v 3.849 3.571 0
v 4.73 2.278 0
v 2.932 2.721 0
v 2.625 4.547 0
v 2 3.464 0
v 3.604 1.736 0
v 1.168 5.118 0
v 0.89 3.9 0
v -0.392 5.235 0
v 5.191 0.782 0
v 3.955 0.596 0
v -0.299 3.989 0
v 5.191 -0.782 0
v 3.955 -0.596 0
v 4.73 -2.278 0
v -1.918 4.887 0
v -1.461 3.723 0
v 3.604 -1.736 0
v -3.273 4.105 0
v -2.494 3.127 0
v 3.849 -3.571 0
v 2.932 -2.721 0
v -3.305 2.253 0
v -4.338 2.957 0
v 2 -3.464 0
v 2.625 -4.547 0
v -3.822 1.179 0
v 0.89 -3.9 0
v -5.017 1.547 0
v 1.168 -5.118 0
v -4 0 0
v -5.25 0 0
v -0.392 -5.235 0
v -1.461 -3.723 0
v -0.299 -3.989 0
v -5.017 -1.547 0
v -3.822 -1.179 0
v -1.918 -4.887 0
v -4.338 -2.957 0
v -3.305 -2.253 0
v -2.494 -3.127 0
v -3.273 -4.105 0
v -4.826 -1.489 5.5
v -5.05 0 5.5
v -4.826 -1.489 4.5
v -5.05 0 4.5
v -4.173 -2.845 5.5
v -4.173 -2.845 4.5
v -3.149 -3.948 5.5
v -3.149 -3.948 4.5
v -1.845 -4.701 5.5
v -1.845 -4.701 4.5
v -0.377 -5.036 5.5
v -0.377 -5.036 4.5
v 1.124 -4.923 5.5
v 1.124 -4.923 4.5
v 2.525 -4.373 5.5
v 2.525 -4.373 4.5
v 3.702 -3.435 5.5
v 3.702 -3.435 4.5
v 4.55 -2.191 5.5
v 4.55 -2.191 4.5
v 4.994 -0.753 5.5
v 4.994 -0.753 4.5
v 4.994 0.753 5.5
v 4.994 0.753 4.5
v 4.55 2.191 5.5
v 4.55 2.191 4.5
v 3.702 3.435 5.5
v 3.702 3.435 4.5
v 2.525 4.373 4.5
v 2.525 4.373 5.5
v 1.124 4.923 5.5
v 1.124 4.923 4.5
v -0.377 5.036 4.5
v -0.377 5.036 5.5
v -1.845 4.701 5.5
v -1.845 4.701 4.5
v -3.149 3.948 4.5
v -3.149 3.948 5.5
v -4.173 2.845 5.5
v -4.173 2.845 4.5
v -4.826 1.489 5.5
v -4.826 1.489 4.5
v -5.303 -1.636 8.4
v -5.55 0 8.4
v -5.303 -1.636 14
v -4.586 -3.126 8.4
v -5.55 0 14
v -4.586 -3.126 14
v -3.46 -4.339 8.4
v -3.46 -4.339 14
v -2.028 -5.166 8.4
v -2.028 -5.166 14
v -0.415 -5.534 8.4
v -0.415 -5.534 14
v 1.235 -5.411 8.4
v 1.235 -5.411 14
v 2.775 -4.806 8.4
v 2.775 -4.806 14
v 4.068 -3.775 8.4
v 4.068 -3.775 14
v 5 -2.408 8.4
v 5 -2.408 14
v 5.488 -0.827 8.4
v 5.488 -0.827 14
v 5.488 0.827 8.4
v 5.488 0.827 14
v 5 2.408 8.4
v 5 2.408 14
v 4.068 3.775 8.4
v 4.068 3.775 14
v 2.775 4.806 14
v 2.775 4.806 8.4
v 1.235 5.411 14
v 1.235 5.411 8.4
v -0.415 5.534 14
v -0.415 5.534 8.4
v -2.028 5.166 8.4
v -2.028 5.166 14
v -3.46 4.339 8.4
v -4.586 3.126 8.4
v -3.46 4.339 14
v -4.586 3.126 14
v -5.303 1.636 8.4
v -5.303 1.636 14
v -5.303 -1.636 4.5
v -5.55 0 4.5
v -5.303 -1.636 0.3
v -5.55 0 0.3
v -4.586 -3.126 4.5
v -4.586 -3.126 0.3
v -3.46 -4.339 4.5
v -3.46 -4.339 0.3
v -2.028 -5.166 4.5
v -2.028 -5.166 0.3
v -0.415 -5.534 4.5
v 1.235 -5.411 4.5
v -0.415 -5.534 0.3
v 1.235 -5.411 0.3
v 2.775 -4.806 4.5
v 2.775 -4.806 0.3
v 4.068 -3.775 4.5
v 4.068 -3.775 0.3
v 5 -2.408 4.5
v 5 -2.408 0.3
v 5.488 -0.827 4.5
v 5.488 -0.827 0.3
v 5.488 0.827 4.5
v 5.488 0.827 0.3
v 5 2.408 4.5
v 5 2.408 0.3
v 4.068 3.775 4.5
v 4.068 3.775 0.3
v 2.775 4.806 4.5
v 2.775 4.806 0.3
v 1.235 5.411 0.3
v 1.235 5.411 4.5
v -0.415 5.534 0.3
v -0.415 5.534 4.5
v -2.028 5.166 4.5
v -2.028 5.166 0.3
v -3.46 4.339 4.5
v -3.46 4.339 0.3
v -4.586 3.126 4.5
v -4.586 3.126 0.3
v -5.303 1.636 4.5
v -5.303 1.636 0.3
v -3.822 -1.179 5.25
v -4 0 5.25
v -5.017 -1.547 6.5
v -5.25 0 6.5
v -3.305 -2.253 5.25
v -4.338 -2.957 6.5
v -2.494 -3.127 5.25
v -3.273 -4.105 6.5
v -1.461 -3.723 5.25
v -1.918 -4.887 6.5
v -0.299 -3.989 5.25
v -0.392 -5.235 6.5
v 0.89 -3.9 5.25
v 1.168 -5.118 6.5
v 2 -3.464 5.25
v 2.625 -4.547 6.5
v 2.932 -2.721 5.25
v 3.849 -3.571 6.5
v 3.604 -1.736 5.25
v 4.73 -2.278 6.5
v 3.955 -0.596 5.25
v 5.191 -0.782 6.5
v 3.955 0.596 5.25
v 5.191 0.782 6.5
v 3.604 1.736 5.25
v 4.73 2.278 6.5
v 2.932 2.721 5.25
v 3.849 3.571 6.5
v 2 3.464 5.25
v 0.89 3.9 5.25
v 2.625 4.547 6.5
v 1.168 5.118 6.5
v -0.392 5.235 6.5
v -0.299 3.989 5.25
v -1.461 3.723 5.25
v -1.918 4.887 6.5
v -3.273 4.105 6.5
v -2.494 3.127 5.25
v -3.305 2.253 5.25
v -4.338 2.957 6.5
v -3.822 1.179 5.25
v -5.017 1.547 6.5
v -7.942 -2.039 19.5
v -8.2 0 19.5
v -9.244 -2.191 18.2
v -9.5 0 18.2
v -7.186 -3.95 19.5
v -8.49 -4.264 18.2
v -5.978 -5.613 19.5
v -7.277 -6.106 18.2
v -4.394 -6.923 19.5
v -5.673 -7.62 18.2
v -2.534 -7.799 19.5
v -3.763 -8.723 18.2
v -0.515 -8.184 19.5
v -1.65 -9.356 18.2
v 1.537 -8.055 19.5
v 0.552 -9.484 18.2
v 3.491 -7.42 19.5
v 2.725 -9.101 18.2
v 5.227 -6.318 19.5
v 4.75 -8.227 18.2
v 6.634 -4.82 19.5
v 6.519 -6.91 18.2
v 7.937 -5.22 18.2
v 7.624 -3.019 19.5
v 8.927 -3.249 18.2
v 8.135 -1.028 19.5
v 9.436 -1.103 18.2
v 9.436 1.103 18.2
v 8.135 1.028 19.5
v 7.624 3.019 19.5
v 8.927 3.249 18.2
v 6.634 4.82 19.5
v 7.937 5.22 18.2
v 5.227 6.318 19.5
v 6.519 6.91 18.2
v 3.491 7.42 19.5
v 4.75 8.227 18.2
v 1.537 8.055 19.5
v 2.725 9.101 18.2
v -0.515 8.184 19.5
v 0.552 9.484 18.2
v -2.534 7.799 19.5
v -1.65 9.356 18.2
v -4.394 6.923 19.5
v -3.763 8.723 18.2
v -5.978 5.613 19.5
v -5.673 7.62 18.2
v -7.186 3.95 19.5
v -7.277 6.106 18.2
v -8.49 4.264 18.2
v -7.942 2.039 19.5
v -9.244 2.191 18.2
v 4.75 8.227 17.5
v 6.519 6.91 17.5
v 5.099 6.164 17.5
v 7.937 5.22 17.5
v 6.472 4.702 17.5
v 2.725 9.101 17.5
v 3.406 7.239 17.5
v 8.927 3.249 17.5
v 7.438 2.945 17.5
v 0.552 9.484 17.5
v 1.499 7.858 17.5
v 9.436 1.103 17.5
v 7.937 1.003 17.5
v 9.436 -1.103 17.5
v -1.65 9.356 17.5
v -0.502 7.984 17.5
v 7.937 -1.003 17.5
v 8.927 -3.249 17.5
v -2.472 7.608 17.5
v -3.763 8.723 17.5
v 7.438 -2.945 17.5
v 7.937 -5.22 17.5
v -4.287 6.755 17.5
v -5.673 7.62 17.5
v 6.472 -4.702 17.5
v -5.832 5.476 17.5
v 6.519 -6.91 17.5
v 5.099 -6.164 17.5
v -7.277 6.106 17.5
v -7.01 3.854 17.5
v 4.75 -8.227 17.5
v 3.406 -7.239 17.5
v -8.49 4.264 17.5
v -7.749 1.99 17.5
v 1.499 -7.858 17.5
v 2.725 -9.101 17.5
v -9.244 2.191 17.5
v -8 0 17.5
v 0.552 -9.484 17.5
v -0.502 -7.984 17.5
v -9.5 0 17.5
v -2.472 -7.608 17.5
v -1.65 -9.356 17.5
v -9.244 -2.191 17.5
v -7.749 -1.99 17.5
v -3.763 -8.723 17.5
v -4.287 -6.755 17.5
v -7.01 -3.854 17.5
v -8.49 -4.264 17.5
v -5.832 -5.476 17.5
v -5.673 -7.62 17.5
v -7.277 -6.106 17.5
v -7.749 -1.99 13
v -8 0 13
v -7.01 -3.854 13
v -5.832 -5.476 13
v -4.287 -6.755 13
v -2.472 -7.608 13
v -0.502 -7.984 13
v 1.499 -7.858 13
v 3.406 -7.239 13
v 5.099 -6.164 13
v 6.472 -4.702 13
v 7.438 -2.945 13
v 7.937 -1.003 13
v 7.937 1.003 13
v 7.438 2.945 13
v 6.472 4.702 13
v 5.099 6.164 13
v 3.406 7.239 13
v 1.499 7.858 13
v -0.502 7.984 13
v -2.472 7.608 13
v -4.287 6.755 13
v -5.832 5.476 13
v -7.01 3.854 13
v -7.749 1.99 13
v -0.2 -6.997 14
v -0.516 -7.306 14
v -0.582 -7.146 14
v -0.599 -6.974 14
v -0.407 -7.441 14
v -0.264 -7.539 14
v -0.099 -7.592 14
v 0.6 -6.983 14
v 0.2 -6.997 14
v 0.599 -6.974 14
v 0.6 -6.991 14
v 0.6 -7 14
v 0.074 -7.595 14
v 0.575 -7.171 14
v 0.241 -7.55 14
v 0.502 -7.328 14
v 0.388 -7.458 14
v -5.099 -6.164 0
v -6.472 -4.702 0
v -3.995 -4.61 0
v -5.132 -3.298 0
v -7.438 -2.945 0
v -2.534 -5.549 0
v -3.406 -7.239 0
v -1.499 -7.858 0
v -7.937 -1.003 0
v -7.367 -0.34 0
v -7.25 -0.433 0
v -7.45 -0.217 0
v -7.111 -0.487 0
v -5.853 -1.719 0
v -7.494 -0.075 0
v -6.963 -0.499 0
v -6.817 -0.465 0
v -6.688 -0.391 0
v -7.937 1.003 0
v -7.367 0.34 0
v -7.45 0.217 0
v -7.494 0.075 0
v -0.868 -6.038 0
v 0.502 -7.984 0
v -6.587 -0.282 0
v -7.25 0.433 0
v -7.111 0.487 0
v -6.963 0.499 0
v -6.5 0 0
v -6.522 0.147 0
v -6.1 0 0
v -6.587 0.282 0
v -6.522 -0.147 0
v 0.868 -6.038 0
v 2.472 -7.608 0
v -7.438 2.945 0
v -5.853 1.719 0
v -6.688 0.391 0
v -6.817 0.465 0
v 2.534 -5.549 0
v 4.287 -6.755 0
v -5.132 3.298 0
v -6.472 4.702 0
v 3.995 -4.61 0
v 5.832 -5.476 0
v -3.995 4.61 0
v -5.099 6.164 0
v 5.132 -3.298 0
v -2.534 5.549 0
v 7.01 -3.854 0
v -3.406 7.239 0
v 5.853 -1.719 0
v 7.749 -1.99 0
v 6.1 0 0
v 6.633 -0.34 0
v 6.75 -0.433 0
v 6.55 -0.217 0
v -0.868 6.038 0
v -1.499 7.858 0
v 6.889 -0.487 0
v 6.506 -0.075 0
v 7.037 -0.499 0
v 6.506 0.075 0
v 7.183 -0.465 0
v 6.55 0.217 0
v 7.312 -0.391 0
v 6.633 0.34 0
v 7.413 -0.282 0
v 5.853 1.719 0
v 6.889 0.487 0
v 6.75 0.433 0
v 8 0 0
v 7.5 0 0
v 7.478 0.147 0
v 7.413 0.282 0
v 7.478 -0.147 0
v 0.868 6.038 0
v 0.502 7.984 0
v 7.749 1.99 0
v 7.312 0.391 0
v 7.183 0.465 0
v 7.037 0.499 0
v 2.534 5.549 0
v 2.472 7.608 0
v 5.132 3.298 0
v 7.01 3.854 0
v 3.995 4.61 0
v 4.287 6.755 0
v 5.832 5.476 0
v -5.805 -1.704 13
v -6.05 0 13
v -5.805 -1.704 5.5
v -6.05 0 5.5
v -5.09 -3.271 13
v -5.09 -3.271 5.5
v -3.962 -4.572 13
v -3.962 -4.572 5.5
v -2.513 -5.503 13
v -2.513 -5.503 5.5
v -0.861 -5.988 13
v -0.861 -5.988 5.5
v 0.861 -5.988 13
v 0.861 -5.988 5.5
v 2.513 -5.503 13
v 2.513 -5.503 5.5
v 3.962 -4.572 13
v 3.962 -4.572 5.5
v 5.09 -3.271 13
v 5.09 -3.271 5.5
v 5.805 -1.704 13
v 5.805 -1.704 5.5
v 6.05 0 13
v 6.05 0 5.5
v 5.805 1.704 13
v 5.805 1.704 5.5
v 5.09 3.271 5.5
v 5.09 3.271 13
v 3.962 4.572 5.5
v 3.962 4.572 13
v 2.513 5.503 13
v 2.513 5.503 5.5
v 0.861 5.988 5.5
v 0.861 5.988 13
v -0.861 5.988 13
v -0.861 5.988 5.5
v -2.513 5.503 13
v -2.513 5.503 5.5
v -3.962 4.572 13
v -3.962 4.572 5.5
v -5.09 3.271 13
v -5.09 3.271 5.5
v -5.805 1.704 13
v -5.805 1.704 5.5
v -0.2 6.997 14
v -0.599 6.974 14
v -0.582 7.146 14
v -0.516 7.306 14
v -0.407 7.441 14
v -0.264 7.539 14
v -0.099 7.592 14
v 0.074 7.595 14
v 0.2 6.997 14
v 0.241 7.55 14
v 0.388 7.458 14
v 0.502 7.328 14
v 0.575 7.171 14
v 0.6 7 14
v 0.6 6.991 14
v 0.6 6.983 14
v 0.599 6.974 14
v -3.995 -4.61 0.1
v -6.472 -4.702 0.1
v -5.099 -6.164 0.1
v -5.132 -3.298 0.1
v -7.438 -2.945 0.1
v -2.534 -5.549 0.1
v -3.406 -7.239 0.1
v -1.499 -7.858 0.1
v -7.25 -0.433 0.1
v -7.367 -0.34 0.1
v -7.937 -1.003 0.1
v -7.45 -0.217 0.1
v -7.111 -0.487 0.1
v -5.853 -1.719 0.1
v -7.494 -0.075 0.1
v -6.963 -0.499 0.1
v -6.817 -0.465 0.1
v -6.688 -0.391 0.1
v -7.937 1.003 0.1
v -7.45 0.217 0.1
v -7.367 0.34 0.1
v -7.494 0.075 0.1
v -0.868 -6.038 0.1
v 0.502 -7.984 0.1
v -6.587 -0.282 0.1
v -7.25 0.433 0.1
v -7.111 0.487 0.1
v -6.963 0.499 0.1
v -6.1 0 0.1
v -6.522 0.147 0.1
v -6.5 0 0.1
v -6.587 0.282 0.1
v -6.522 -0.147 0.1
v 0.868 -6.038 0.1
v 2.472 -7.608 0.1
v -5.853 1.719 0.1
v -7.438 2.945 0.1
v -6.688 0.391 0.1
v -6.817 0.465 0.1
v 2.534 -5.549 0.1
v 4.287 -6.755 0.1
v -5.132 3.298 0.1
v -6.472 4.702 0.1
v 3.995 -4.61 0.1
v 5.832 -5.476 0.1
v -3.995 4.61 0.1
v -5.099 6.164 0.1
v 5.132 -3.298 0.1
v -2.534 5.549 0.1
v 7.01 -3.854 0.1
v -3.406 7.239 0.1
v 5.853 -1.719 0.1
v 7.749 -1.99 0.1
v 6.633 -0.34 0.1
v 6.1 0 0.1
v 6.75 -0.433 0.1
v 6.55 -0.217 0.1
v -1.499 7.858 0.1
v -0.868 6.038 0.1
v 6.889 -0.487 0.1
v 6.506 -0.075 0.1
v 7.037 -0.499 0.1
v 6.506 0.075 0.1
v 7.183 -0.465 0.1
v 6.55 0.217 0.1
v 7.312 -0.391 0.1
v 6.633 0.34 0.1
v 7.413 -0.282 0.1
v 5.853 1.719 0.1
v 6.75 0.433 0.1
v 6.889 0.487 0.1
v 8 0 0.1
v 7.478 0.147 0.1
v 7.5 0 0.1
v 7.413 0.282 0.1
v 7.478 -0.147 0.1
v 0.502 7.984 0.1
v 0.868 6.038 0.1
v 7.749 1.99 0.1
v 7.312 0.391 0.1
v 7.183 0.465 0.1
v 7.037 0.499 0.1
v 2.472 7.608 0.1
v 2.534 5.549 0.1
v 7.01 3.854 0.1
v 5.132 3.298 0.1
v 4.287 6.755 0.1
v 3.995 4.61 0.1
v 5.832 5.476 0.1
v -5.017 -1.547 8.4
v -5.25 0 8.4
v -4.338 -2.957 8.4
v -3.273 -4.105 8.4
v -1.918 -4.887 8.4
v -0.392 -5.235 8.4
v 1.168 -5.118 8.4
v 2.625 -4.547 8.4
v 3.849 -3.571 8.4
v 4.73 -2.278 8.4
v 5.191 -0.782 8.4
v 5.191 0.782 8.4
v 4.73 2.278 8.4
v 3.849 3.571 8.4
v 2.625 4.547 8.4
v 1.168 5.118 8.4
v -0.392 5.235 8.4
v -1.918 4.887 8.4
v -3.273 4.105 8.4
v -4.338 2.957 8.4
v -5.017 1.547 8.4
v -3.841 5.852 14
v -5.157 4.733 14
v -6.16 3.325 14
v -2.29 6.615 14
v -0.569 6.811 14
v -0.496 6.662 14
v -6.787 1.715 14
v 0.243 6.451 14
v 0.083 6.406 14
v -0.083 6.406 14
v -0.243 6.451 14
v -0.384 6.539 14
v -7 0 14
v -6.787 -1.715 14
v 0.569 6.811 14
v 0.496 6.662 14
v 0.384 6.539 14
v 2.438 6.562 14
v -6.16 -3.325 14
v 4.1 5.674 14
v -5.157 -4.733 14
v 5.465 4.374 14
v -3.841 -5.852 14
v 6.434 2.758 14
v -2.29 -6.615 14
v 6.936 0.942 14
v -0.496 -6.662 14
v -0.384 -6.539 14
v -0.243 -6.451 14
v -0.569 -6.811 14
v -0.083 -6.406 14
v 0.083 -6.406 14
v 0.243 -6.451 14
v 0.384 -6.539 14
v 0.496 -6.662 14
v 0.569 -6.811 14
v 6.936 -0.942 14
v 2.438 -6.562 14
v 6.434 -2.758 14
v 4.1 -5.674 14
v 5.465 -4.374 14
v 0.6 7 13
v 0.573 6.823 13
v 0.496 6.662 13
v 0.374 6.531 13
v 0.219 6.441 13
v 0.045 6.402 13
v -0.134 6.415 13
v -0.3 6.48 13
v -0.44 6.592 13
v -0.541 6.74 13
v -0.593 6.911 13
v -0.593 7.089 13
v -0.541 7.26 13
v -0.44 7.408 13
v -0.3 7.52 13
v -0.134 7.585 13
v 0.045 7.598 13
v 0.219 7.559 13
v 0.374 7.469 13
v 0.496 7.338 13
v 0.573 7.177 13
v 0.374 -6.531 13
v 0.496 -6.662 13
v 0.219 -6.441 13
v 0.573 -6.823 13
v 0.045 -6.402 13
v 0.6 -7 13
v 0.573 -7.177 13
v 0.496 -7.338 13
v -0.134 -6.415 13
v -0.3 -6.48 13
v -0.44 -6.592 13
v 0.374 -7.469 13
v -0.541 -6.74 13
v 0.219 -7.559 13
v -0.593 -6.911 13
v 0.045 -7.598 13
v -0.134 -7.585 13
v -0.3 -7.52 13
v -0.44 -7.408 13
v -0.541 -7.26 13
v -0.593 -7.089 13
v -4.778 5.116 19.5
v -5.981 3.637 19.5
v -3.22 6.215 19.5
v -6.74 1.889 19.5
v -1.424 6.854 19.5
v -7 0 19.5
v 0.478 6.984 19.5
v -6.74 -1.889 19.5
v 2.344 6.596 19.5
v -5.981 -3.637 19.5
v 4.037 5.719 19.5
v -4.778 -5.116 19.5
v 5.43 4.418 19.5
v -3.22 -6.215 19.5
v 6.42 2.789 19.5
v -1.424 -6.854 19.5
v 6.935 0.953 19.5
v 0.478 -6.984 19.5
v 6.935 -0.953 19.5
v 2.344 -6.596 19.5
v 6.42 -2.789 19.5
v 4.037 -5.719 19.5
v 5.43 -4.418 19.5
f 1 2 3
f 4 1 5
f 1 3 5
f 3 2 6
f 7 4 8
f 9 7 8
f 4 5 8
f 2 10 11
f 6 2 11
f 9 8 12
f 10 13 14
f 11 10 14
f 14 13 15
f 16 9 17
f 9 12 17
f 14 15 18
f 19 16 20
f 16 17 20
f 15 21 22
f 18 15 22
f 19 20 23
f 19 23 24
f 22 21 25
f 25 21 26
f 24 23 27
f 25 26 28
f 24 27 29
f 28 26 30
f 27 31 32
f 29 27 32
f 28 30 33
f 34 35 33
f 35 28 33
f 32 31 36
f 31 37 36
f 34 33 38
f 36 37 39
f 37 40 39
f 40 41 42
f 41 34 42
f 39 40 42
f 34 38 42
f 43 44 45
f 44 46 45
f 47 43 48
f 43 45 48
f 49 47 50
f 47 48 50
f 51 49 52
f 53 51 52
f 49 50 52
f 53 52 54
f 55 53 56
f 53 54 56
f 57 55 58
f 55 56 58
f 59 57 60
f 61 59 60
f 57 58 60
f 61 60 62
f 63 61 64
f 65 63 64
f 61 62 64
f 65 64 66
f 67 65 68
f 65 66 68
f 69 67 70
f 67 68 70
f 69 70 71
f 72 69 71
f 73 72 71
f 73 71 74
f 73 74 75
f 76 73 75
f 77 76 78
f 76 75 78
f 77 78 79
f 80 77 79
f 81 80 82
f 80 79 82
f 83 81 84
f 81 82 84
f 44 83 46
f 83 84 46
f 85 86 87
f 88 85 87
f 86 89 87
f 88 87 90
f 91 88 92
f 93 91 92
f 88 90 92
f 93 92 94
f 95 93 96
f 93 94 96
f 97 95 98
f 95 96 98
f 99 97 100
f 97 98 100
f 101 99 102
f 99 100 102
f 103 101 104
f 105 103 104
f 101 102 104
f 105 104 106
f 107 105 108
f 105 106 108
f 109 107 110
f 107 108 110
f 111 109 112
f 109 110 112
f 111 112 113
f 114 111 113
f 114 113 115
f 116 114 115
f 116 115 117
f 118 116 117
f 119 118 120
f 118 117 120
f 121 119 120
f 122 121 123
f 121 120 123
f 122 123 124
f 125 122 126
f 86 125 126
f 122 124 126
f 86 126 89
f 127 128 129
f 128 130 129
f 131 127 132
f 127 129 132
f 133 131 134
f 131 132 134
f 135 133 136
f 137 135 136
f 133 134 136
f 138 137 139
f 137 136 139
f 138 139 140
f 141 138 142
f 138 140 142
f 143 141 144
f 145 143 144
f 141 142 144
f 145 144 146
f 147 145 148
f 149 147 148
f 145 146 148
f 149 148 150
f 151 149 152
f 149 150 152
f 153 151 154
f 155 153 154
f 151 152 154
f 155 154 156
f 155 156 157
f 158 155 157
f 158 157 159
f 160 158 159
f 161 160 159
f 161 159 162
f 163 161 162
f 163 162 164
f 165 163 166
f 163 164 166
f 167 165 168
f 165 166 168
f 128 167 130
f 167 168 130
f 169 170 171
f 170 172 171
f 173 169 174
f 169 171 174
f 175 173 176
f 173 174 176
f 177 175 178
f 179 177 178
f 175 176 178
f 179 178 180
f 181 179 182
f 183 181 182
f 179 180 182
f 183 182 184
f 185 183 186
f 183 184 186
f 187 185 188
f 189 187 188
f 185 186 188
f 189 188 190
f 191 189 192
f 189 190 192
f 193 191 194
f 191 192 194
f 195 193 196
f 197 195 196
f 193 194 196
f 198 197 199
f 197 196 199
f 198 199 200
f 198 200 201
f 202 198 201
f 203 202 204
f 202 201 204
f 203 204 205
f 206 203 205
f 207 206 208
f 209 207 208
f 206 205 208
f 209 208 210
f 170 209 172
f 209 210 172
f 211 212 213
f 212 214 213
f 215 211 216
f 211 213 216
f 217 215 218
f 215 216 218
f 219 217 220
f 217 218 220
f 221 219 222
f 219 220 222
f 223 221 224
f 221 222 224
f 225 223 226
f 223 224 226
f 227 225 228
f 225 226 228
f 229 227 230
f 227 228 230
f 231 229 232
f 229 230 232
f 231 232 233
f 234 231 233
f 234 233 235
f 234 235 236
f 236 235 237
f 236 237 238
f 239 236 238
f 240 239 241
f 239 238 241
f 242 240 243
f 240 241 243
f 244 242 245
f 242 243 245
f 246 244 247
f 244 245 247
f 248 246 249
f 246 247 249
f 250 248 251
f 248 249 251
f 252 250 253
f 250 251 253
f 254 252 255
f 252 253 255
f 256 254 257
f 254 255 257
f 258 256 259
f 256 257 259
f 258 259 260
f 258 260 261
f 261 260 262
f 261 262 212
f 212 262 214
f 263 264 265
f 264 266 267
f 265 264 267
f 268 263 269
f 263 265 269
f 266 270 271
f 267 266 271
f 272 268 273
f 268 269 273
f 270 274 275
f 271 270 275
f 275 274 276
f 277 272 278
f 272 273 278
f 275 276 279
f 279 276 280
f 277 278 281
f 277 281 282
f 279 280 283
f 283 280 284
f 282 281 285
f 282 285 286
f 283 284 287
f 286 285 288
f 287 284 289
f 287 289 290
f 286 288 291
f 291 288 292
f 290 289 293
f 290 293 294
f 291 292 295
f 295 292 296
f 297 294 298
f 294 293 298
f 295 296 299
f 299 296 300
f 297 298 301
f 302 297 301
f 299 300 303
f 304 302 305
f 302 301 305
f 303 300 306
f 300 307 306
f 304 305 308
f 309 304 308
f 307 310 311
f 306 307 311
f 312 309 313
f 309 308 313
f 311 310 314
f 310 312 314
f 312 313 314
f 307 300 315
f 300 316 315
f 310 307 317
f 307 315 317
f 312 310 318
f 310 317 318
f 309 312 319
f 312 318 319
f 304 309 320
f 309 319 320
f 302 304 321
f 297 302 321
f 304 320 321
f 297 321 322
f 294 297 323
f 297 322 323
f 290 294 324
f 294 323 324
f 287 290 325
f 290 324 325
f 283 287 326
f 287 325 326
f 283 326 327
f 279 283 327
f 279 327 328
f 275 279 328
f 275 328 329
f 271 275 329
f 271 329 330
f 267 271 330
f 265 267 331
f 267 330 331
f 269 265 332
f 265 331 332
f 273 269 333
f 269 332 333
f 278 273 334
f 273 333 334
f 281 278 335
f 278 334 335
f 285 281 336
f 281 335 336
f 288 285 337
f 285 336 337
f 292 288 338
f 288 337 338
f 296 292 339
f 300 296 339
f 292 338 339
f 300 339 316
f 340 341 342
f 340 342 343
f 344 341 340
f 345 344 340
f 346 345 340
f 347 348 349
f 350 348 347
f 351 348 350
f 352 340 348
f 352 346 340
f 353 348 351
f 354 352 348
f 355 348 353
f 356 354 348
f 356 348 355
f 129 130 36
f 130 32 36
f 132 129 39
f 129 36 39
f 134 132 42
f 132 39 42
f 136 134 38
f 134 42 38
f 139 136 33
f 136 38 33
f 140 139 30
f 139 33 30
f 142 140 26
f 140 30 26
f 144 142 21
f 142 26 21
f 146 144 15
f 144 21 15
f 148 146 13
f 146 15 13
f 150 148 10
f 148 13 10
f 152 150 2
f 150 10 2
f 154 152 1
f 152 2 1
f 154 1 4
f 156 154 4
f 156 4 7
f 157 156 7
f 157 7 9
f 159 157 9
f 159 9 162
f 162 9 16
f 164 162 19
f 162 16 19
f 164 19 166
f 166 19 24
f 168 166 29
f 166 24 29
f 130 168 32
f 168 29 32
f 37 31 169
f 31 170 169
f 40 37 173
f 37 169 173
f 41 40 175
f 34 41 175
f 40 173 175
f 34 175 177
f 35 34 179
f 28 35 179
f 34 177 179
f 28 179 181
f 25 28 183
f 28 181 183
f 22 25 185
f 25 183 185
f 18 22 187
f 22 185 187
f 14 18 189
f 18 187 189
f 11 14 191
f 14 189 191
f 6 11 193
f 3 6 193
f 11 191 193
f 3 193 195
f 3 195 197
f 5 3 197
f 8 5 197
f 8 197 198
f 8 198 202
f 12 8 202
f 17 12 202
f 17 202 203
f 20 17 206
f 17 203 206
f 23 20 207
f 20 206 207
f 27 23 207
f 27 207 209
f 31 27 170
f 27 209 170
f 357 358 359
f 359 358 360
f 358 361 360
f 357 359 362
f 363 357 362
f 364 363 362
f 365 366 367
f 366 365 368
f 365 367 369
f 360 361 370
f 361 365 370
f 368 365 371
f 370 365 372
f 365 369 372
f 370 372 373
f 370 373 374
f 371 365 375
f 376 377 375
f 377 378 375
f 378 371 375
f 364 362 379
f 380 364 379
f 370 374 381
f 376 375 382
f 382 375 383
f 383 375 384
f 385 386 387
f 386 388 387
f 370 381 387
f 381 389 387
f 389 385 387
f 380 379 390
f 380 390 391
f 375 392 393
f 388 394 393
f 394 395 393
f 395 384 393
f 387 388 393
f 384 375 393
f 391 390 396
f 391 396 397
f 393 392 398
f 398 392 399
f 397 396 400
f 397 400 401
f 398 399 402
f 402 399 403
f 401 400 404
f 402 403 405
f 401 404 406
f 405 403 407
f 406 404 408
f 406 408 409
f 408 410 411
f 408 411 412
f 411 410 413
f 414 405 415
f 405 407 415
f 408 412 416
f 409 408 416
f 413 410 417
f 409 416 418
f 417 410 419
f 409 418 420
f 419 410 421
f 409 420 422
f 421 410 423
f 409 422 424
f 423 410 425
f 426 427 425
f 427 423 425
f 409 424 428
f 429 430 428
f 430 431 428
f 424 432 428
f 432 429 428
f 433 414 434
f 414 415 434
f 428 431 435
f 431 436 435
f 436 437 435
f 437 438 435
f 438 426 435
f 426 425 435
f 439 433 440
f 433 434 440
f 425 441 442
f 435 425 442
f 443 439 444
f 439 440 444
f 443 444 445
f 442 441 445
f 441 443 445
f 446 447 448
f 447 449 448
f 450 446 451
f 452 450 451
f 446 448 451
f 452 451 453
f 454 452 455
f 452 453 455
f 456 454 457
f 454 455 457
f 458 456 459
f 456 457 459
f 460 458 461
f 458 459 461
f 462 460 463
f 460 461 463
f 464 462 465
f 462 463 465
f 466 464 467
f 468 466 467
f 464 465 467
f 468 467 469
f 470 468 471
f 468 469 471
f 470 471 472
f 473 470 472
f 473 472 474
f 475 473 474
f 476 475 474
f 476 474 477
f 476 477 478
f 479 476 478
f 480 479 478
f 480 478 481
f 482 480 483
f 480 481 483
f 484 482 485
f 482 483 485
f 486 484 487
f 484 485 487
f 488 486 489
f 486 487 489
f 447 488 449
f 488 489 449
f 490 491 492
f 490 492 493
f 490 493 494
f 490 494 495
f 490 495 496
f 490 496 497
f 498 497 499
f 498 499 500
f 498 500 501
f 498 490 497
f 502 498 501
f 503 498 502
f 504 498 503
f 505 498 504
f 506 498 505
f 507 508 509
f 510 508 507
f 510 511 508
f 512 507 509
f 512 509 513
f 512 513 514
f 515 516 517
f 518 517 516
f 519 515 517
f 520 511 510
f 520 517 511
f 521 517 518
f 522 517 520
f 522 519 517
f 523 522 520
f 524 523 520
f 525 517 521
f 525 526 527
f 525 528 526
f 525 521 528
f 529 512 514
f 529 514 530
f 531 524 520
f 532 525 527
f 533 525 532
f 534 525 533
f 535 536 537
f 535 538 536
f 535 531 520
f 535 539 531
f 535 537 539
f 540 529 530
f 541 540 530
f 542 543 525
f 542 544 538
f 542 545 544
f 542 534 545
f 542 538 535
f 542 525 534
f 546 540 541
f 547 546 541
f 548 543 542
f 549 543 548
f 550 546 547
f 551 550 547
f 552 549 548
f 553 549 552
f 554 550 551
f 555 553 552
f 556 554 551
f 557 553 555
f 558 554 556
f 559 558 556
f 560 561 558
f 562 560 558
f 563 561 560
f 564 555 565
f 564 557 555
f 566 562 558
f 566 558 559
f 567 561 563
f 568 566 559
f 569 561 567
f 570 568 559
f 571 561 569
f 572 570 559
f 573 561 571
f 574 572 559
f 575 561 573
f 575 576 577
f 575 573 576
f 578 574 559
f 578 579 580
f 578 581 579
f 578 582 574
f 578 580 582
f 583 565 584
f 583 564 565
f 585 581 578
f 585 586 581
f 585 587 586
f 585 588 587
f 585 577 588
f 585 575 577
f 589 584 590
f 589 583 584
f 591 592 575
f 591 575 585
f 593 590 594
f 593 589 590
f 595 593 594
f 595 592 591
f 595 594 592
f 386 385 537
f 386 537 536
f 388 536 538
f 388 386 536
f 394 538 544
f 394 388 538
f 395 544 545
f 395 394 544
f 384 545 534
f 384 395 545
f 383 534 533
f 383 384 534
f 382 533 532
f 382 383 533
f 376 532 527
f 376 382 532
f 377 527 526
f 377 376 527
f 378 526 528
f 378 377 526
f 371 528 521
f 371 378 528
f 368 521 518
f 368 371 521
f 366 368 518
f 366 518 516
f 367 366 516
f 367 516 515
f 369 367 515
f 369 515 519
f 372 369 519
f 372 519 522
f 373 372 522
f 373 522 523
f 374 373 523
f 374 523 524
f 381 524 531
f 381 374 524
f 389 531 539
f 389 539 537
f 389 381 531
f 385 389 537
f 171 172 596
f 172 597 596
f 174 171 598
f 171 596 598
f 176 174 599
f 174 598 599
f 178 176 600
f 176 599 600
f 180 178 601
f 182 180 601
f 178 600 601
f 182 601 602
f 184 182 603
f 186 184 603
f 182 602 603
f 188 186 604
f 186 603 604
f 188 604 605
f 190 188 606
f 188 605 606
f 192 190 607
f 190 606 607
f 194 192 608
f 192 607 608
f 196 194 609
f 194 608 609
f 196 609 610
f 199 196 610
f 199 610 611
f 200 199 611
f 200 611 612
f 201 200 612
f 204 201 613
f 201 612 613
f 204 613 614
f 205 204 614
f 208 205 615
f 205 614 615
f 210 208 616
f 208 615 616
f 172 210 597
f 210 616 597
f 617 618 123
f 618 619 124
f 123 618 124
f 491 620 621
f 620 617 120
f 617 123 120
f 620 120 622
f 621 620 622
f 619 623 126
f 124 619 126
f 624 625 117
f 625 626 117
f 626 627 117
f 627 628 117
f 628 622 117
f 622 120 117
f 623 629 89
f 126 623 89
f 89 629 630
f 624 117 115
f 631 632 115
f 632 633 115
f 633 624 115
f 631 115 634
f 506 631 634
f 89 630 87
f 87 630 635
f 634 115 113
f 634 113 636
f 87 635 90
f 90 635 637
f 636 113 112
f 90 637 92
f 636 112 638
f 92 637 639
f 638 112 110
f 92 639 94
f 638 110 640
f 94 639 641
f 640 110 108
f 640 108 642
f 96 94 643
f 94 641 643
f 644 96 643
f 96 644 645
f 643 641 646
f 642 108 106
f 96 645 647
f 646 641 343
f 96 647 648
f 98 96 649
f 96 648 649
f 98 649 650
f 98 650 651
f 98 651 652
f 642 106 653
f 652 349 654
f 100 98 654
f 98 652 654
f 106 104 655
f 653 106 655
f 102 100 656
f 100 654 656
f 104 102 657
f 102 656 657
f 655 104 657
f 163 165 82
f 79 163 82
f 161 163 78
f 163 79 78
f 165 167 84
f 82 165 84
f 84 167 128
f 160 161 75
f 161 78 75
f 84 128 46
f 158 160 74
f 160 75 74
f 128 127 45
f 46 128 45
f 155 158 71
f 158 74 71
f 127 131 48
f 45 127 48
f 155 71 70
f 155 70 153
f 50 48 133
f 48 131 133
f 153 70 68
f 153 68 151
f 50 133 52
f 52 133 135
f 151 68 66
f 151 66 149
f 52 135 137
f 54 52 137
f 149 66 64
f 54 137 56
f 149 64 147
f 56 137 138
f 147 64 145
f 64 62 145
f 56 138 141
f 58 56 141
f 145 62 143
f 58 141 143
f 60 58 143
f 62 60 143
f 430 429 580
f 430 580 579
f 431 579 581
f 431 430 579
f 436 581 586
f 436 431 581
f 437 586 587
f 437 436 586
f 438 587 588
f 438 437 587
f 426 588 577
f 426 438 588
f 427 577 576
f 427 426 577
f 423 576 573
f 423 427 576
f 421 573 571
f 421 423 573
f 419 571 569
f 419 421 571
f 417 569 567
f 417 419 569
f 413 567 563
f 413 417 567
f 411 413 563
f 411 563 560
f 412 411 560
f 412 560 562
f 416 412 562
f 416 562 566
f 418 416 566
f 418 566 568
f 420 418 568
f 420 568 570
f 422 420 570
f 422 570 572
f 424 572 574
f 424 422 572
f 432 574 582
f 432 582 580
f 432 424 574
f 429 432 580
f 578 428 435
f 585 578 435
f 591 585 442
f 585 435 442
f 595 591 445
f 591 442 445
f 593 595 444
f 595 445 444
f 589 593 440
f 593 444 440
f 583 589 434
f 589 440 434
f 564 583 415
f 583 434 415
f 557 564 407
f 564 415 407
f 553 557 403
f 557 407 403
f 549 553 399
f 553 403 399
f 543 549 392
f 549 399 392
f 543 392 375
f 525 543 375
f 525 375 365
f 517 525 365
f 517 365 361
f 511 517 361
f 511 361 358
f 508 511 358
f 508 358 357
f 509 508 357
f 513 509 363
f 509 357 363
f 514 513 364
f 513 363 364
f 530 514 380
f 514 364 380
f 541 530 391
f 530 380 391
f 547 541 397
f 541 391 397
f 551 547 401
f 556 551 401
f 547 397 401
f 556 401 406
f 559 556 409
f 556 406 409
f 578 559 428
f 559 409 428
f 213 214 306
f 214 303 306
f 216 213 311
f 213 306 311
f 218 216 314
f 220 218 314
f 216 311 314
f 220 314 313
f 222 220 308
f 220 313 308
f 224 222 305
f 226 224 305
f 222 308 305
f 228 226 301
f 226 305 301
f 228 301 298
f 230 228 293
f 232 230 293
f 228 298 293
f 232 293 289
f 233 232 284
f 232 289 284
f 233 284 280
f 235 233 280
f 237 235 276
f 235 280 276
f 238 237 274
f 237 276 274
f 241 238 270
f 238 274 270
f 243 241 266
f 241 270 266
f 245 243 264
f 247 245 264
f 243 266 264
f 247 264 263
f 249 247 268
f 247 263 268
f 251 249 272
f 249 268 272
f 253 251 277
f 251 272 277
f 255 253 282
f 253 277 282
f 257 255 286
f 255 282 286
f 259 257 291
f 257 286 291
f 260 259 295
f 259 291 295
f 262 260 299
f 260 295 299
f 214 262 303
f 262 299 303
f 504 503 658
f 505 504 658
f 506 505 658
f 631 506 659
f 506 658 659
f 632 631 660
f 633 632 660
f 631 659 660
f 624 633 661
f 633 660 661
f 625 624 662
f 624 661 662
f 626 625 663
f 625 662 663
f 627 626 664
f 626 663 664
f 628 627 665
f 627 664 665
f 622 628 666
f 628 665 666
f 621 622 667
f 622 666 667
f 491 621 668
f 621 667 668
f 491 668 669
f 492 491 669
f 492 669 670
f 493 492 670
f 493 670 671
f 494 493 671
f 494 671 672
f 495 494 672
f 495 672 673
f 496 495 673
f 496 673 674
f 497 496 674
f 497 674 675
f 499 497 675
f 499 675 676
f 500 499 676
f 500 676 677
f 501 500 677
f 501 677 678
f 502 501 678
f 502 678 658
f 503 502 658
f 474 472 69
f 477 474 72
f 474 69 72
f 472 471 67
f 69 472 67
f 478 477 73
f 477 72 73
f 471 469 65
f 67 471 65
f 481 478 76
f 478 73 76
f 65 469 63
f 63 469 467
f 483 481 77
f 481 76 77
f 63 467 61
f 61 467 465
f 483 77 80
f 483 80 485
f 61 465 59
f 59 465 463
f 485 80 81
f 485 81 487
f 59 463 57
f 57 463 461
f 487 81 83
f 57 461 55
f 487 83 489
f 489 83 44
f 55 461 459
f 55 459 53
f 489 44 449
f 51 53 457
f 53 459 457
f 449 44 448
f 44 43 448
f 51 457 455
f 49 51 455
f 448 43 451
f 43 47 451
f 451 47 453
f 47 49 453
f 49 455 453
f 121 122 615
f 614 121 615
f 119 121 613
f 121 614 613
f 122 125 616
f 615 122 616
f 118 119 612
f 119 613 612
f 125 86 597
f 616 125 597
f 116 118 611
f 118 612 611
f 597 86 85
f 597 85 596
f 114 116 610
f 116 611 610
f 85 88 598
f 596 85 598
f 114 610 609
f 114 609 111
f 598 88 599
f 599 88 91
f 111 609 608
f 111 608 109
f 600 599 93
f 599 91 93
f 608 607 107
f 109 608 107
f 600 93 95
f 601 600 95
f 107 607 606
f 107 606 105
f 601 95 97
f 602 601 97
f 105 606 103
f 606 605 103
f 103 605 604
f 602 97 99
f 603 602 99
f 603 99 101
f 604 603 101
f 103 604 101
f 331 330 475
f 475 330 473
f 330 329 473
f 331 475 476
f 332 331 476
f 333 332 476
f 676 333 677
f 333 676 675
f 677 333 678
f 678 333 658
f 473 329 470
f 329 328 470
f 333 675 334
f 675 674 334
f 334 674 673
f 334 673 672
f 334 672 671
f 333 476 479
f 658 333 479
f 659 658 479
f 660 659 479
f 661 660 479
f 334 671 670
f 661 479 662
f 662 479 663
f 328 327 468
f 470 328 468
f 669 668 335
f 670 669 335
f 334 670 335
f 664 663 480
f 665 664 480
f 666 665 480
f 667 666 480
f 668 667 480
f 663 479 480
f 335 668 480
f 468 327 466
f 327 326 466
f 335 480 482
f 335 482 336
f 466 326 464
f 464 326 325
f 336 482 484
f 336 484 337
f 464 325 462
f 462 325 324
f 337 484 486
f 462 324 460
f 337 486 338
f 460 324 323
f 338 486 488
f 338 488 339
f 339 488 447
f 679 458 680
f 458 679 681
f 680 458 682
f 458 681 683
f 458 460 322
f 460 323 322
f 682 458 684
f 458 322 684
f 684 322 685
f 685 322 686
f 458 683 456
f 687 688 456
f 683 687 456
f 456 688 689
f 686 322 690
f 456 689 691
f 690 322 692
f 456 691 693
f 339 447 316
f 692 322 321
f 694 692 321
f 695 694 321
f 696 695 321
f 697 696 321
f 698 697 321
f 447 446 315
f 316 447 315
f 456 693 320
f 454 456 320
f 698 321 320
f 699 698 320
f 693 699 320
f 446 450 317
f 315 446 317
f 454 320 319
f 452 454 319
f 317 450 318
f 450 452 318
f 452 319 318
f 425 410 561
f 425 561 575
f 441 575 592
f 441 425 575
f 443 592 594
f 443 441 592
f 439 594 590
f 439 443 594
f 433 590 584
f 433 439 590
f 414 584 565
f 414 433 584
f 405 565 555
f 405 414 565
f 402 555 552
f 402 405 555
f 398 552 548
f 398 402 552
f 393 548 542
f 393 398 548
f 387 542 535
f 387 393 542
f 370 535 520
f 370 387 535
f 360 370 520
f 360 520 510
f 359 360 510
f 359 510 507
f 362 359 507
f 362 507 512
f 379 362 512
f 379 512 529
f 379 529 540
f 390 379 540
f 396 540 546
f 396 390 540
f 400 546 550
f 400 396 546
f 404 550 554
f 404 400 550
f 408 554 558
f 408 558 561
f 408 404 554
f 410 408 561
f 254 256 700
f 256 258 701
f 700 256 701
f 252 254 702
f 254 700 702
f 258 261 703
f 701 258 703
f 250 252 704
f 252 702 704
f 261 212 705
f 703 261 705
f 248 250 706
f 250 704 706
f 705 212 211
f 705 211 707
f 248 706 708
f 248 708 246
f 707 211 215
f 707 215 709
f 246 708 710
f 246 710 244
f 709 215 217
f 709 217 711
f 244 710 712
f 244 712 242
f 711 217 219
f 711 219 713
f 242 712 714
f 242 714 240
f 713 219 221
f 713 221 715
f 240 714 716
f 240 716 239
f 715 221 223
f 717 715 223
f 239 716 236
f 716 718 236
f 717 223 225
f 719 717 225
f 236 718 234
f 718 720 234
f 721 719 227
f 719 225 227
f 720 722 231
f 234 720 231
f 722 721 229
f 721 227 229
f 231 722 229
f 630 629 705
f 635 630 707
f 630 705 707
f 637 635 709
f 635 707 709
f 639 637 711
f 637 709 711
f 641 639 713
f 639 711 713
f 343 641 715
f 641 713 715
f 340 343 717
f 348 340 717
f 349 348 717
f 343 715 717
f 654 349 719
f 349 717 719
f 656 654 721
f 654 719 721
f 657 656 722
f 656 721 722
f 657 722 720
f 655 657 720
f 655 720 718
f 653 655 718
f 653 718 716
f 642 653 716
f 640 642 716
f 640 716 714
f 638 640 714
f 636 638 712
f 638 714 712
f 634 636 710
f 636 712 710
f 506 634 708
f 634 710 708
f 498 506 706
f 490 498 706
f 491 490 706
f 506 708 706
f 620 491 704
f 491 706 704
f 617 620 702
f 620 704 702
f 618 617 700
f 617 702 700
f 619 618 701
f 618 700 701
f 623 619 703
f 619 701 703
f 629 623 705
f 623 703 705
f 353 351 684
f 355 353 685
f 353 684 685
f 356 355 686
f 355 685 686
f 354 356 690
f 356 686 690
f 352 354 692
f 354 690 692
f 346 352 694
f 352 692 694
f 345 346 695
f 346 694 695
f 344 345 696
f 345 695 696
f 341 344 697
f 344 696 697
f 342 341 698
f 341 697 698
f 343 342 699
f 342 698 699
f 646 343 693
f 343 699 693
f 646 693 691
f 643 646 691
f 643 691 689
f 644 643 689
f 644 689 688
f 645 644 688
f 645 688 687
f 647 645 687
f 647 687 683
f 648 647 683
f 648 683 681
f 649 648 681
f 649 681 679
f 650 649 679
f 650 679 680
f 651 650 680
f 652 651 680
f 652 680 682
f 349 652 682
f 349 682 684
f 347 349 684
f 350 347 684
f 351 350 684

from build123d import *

# Parameters (mm, degrees)
F2_R     = 0.6
F3_DEPTH = 1
F4_R     = 8
F4_R_2   = 0.5
F4_R_3   = 6.1
F5_DEPTH = 0.1


with BuildPart() as f1:
    # F0 (on Front) → F1 (revolve)
    with BuildSketch(Plane.XZ):
        Polygon((-5.25, 0), (-4, 0), (-4, 5.25), (-5.25, 6.5), (-5.25, 8.4), (-5.55, 8.4), (-5.55, 14), (-7, 14), (-7, 19.5), (-8.2, 19.5), (-9.5, 18.2), (-9.5, 17.5), (-8, 17.5), (-8, 13), (-6.05, 13), (-6.05, 5.5), (-5.05, 5.5), (-5.05, 4.5), (-5.55, 4.5), (-5.55, 0.3), align=None)
    revolve(axis=Axis((0, 0, 9.75), (0, 0, 1)))

    # F2 (on face) → F3 (cut)
    with BuildSketch(Plane(origin=(0, 0, 13), x_dir=(1, 0, 0), z_dir=(0, 0, -1))):
        with Locations((0, 7)):
            Circle(F2_R)
        with Locations((0, -7)):
            Circle(F2_R)
    extrude(amount=-F3_DEPTH, mode=Mode.SUBTRACT)


with BuildPart() as f5:
    # F4 (on Top) → F5 (new body)
    with BuildSketch(Plane.XY):
        Circle(F4_R)
        with Locations((-7, 0)):
            Circle(F4_R_2, mode=Mode.SUBTRACT)
        Circle(F4_R_3, mode=Mode.SUBTRACT)
        with Locations((7, 0)):
            Circle(F4_R_2, mode=Mode.SUBTRACT)
    extrude(amount=F5_DEPTH)


solid = Compound([f1.part, f5.part])
